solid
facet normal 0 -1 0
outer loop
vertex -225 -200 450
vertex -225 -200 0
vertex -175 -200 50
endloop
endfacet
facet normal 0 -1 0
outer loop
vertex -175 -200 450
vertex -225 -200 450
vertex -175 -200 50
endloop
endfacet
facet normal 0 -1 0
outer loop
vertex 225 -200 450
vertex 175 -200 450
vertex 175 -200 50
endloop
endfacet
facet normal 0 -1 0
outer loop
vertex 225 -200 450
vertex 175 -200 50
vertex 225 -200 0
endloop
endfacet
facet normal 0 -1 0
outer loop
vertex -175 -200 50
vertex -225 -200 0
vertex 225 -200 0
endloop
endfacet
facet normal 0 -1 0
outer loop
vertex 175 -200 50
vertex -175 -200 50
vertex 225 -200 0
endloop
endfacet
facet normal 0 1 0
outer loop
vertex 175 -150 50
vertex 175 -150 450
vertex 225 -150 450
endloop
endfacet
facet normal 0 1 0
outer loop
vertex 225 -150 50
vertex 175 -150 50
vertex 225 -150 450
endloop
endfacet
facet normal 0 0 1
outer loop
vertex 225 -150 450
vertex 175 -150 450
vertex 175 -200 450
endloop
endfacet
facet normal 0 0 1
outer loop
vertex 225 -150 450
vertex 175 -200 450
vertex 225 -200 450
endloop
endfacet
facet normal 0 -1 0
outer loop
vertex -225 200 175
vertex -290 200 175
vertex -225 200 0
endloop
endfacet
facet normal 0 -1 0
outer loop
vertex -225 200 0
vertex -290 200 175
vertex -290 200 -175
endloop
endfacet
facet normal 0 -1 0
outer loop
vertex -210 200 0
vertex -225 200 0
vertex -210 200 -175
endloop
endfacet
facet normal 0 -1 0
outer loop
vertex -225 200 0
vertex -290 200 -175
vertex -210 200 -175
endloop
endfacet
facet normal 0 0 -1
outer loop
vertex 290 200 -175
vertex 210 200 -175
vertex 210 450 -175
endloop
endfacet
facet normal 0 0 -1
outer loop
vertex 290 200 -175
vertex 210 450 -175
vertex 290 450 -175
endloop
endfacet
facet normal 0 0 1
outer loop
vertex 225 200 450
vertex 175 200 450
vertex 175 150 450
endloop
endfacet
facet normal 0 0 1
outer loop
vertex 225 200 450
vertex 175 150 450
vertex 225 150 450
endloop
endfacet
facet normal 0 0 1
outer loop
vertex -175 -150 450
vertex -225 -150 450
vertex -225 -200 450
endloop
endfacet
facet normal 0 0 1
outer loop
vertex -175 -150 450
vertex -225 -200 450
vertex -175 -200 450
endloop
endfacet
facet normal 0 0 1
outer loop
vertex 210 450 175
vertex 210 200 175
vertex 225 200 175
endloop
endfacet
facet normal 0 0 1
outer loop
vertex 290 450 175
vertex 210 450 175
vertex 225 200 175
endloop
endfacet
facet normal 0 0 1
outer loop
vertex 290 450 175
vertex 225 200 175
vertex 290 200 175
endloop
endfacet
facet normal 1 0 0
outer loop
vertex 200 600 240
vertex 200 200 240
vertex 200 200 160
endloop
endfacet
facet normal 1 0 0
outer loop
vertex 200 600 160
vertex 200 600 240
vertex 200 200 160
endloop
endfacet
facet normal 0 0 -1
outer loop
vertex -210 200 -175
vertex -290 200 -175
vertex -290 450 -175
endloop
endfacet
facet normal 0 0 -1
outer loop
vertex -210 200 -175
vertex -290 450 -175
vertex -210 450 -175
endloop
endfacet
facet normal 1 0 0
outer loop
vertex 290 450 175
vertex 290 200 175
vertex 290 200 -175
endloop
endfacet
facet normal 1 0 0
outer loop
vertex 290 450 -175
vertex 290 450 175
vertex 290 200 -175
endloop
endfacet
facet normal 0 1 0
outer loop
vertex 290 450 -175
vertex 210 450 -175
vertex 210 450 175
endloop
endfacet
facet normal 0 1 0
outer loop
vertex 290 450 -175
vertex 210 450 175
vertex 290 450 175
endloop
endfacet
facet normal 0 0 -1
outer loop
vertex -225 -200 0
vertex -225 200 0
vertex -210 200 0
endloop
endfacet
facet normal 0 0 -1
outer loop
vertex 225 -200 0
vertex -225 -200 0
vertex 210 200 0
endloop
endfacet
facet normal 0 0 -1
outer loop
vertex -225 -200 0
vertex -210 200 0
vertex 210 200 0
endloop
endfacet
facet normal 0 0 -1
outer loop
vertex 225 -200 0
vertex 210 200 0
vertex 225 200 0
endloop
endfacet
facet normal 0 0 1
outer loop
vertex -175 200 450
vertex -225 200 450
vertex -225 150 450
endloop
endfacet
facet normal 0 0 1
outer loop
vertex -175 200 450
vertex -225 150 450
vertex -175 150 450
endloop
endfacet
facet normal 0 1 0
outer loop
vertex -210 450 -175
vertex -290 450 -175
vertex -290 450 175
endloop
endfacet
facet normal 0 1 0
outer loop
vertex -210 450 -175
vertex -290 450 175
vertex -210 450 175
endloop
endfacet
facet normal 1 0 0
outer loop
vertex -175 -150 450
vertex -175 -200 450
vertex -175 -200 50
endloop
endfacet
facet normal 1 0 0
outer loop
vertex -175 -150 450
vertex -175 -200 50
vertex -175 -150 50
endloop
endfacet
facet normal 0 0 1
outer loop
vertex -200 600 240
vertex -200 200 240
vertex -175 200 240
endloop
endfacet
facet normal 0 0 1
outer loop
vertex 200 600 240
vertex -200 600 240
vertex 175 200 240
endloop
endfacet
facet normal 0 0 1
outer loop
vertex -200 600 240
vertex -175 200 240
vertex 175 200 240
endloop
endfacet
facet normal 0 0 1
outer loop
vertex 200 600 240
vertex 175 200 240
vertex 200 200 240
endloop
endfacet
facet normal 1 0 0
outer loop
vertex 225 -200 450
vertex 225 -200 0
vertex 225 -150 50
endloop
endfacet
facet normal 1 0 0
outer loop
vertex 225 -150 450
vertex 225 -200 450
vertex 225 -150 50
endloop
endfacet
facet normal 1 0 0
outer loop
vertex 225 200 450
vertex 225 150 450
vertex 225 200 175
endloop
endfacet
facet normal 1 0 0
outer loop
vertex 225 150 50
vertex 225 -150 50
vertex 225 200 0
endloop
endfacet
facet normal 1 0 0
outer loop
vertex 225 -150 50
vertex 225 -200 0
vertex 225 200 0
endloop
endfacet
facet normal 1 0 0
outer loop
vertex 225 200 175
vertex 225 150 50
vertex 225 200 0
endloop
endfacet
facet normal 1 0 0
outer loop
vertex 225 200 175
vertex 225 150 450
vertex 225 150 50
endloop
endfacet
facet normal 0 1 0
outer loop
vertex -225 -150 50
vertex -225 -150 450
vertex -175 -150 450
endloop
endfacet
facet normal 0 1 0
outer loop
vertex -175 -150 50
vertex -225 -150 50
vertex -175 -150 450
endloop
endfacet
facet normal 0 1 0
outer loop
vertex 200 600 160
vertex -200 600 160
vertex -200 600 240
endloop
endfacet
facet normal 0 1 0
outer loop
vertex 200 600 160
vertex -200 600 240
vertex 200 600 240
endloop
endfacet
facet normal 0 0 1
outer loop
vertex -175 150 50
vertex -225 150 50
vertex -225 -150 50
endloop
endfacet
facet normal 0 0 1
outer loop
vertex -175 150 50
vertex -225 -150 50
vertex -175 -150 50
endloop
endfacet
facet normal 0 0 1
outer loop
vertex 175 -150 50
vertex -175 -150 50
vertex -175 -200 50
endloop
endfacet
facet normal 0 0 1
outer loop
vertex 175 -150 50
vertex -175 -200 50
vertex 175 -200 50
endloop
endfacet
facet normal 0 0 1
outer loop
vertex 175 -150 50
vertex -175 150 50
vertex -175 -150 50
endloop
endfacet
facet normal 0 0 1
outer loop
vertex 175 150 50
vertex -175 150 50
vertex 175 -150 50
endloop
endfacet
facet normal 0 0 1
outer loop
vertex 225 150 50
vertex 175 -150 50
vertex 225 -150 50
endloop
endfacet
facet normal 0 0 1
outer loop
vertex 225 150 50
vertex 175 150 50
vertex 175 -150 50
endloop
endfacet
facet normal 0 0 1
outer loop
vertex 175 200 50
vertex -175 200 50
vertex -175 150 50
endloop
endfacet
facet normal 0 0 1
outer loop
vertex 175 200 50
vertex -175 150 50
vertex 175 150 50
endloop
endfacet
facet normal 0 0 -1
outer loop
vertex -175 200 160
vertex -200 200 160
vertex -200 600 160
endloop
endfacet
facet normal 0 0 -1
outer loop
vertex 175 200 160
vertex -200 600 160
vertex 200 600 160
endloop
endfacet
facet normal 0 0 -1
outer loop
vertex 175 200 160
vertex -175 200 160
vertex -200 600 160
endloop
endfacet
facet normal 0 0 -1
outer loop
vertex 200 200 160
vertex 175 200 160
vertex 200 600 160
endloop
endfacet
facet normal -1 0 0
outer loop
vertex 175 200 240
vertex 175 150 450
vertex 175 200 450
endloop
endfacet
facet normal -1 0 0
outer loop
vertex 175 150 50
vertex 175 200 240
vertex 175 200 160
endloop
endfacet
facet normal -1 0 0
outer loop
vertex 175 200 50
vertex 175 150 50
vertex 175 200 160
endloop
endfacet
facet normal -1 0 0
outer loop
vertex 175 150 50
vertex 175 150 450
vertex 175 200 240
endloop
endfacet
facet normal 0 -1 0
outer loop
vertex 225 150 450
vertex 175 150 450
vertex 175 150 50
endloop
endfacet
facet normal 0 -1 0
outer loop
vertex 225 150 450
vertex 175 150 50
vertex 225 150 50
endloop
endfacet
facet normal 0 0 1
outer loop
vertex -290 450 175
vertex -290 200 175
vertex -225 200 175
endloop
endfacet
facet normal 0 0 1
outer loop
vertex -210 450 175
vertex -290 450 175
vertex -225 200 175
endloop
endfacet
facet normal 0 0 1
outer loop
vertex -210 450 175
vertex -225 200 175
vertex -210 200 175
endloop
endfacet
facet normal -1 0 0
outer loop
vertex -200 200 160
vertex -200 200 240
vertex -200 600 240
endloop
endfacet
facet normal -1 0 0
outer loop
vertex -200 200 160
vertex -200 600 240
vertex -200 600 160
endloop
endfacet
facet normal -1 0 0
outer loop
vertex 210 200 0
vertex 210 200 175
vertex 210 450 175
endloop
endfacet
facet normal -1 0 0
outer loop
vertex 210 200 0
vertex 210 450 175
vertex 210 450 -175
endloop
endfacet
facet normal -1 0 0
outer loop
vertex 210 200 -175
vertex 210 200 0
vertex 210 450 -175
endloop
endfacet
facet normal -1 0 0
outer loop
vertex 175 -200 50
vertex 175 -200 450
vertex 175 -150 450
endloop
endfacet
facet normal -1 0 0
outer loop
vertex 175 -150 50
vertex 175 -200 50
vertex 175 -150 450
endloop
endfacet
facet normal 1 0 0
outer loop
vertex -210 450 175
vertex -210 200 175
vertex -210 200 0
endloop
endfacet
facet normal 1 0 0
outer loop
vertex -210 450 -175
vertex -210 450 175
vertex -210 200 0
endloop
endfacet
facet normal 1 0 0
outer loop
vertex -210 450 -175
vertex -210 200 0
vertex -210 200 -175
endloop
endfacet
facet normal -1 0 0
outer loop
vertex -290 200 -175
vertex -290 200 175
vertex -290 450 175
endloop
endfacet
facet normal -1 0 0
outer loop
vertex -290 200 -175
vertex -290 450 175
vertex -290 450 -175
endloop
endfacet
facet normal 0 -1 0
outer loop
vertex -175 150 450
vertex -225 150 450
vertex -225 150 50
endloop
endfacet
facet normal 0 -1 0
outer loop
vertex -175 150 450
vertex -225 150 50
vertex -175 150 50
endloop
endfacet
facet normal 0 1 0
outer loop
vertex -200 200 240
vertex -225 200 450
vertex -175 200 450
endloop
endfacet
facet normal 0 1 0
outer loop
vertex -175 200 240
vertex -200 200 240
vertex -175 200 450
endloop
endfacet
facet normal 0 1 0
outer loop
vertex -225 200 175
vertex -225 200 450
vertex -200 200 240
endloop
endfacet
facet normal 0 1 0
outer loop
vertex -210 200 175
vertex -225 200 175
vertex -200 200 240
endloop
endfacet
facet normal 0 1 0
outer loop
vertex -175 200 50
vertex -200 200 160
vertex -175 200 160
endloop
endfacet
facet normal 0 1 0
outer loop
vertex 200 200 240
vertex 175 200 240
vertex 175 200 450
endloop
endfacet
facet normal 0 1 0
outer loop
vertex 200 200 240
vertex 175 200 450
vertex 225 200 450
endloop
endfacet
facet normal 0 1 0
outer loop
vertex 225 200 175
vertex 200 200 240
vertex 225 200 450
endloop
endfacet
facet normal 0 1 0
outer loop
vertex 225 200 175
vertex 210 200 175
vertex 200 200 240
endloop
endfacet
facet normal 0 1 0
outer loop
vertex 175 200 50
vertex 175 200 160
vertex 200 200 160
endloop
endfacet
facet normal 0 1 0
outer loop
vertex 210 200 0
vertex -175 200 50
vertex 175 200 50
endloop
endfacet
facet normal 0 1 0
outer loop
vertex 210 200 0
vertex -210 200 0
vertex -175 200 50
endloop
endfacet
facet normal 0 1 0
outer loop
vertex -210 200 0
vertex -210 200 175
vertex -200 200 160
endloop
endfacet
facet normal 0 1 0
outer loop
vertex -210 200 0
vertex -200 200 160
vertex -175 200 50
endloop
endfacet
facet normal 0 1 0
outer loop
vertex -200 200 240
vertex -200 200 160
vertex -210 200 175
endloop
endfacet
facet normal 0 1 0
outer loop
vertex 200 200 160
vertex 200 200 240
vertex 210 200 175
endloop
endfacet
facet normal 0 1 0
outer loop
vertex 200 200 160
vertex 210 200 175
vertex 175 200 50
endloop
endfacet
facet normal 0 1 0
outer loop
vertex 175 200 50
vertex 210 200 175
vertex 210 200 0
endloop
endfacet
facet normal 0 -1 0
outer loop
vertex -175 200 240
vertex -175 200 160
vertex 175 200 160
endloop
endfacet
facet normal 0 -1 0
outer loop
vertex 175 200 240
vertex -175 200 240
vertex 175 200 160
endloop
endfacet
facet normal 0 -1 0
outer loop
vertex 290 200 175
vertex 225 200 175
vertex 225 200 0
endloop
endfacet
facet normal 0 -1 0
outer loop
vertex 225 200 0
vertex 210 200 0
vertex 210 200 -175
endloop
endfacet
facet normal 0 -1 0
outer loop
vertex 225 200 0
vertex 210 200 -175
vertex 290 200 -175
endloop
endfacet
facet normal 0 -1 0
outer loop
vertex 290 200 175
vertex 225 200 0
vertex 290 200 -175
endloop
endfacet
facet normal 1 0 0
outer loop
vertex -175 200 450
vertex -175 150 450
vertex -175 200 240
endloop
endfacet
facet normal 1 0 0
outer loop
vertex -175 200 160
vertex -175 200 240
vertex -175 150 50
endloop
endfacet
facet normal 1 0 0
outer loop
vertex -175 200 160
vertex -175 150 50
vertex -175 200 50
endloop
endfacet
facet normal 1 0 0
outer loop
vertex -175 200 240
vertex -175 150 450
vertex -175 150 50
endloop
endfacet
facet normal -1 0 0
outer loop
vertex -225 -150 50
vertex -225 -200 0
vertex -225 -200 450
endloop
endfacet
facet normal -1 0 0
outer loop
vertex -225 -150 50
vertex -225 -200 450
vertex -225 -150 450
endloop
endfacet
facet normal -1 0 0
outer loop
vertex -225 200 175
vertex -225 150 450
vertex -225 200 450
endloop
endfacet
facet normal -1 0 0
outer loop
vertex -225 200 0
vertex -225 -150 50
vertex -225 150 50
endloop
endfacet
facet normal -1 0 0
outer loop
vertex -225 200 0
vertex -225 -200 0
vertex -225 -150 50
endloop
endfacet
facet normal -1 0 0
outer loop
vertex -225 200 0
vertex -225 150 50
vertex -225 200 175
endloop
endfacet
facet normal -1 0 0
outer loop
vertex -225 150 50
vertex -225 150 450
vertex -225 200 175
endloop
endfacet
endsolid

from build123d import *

# Parameters (mm, degrees)
SKETCH_1_W      = 450
SKETCH_1_H      = 400
EXTRUDE_1_DEPTH = 50
SKETCH_2_W      = 50
SKETCH_2_H      = 50
EXTRUDE_2_DEPTH = 450
SKETCH_3_W      = 50
SKETCH_3_H      = 50
EXTRUDE_3_DEPTH = 450
SKETCH_4_W      = 50
SKETCH_4_H      = 50
EXTRUDE_4_DEPTH = 450
SKETCH_5_W      = 50
SKETCH_5_H      = 50
EXTRUDE_5_DEPTH = 450
SKETCH_6_W      = 400
SKETCH_6_H      = 80
EXTRUDE_6_DEPTH = 400
SKETCH_7_W      = 80
SKETCH_7_H      = 350
EXTRUDE_7_DEPTH = 250
SKETCH_8_W      = 80
SKETCH_8_H      = 350
EXTRUDE_8_DEPTH = 250


with BuildPart() as part:
    # 草图1 → 凸台-拉伸1 (new body)
    with BuildSketch(Plane.XY):
        Rectangle(SKETCH_1_W, SKETCH_1_H)
    extrude(amount=EXTRUDE_1_DEPTH)

    # 草图2 → 凸台-拉伸2 (add)
    with BuildSketch(Plane.XY):
        with Locations((-200, -175)):
            Rectangle(SKETCH_2_W, SKETCH_2_H)
    extrude(amount=EXTRUDE_2_DEPTH)

    # 草图3 → 凸台-拉伸3 (add)
    with BuildSketch(Plane.XY):
        with Locations((200, -175)):
            Rectangle(SKETCH_3_W, SKETCH_3_H)
    extrude(amount=EXTRUDE_3_DEPTH)

    # 草图4 → 凸台-拉伸4 (add)
    with BuildSketch(Plane.XY):
        with Locations((-200, 175)):
            Rectangle(SKETCH_4_W, SKETCH_4_H)
    extrude(amount=EXTRUDE_4_DEPTH)

    # 草图5 → 凸台-拉伸5 (add)
    with BuildSketch(Plane.XY):
        with Locations((200, 175)):
            Rectangle(SKETCH_5_W, SKETCH_5_H)
    extrude(amount=EXTRUDE_5_DEPTH)

    # 草图6 → 凸台-拉伸6 (add)
    with BuildSketch(Plane(origin=(0, 200, 0), x_dir=(1, 0, 0), z_dir=(0, 1, 0))):
        with Locations((0, -200)):
            Rectangle(SKETCH_6_W, SKETCH_6_H)
    extrude(amount=EXTRUDE_6_DEPTH)

    # 草图7 → 凸台-拉伸7 (add)
    with BuildSketch(Plane(origin=(0, 200, 0), x_dir=(1, 0, 0), z_dir=(0, 1, 0))):
        with Locations((-250, 0)):
            Rectangle(SKETCH_7_W, SKETCH_7_H)
    extrude(amount=EXTRUDE_7_DEPTH)

    # 草图8 → 凸台-拉伸8 (add)
    with BuildSketch(Plane(origin=(0, 200, 0), x_dir=(1, 0, 0), z_dir=(0, 1, 0))):
        with Locations((250, 0)):
            Rectangle(SKETCH_8_W, SKETCH_8_H)
    extrude(amount=EXTRUDE_8_DEPTH)


solid = part.part
